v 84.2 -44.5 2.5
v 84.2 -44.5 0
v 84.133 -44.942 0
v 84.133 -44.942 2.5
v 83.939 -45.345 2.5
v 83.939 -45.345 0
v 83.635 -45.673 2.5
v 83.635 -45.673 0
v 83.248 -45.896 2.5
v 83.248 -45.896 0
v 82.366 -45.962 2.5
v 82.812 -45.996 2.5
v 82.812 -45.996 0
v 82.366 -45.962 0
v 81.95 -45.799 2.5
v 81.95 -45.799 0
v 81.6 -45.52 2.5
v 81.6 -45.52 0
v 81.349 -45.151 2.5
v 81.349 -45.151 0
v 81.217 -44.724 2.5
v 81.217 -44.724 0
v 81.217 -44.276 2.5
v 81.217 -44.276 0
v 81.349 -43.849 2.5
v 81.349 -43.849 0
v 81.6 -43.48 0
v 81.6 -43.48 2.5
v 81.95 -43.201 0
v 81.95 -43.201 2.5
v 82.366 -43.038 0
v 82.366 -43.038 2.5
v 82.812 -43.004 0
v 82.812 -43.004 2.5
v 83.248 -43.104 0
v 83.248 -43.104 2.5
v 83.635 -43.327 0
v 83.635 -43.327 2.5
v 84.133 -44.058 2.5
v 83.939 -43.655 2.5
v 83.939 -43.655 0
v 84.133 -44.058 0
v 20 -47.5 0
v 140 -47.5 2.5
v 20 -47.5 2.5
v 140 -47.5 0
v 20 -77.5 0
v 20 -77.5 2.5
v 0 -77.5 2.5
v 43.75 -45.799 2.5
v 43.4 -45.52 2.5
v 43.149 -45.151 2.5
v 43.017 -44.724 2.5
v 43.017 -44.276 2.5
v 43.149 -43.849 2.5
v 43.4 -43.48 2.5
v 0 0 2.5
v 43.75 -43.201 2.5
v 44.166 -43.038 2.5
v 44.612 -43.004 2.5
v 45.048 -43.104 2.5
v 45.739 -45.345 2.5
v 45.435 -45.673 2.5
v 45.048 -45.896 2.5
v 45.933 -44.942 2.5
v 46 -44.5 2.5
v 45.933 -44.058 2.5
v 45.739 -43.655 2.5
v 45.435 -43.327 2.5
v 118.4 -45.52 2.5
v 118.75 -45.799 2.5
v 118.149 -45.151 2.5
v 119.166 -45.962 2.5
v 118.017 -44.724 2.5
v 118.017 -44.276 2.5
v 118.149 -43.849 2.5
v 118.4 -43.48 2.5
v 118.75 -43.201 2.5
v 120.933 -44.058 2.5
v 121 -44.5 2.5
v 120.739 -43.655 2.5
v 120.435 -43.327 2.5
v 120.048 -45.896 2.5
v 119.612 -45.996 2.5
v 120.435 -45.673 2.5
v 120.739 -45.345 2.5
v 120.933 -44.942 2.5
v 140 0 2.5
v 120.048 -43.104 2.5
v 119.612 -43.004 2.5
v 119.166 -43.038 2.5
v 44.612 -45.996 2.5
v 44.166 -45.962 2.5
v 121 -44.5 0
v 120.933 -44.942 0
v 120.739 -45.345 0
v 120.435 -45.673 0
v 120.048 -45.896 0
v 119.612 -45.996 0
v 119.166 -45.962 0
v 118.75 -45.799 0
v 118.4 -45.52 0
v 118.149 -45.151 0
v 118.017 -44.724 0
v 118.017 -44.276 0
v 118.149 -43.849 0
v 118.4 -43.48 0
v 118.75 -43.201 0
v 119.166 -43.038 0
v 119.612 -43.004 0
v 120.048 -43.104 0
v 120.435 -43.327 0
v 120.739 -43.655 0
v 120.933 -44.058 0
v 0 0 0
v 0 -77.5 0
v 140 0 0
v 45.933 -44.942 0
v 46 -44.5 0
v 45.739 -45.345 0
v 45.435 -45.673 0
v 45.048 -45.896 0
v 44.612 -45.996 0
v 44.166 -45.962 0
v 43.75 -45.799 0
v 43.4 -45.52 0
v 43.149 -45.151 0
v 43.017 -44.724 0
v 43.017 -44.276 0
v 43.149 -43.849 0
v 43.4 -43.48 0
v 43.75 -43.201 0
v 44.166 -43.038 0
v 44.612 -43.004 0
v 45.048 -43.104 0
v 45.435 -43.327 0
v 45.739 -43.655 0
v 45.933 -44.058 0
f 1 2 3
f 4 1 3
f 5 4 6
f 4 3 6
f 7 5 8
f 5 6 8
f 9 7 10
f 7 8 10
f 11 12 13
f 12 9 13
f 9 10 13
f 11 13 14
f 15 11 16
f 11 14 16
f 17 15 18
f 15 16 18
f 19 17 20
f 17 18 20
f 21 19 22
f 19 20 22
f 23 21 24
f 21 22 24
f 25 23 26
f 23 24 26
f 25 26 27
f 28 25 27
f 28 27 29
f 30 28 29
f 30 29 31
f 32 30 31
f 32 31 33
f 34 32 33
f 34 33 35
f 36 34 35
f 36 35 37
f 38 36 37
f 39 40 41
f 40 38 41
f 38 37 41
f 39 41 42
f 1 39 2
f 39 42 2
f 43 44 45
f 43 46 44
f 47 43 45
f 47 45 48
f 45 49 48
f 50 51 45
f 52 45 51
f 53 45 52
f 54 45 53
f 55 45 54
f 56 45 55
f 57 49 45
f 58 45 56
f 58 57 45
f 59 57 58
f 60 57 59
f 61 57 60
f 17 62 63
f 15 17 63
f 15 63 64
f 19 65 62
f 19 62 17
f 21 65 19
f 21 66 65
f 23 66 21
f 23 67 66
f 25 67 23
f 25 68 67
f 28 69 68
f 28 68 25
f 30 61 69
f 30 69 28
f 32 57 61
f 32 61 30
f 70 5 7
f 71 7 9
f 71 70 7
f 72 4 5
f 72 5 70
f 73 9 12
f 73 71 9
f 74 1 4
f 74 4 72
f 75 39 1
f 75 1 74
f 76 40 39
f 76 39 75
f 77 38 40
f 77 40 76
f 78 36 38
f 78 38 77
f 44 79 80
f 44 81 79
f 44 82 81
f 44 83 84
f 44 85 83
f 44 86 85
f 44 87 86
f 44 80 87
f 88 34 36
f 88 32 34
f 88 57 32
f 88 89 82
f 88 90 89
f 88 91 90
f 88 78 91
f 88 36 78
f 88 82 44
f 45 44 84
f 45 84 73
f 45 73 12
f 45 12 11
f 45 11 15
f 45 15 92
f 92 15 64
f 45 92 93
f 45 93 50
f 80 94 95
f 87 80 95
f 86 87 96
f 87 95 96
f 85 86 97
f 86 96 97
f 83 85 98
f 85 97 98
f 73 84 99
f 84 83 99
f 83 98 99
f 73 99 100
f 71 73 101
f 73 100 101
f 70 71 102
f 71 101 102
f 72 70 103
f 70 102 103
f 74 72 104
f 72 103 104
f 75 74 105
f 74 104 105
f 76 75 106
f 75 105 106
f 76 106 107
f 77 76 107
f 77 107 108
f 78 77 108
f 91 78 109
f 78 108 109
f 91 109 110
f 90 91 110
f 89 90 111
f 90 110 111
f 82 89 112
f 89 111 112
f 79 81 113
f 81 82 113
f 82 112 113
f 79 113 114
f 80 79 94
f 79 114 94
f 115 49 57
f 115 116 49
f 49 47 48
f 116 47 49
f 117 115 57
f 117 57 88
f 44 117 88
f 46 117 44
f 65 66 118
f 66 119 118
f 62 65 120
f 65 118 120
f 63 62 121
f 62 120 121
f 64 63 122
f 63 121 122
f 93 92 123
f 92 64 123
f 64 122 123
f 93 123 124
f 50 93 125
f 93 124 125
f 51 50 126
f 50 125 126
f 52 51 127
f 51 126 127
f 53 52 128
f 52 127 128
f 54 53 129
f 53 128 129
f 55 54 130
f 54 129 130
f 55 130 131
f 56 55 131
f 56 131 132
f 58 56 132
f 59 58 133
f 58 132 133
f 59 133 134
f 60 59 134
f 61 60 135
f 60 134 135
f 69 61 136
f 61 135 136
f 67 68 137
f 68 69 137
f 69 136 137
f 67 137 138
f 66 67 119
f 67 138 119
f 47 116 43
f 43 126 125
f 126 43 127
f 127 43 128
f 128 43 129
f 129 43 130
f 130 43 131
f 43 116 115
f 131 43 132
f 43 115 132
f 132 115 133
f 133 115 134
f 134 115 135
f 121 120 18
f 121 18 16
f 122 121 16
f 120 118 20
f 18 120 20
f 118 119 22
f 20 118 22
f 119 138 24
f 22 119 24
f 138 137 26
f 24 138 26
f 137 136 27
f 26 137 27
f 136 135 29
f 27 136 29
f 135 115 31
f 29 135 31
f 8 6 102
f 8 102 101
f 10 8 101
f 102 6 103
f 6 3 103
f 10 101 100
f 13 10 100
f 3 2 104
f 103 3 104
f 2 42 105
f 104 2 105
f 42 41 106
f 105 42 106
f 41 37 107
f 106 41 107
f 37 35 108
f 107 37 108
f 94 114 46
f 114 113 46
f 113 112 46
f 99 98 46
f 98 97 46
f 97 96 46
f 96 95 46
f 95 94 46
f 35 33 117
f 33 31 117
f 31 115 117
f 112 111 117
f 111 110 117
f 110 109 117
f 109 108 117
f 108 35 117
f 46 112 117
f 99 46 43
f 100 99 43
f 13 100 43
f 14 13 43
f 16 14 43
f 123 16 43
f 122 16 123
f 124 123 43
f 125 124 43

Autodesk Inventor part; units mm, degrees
ref_plane "YZ Plane" through (0, 0, 0) normal (1, 0, 0) x (0, 1, 0)
ref_plane "XZ Plane" through (0, 0, 0) normal (0, 1, 0) x (-1, 0, 0)
ref_plane "XY Plane" through (0, 0, 0) normal (0, 0, 1) x (1, 0, 0)
sketch "Sketch1" plane through (0, 0, 0) normal (0, 0, 1) x (1, 0, 0)
  circle A0 centre (119.5, -44.5) radius 1.5
  circle A1 centre (82.7, -44.5) radius 1.5
  circle A2 centre (44.5, -44.5) radius 1.5
  line L0 (0, 0) -> (140, 0)
  line L1 (140, 0) -> (140, -47.5)
  line L2 (140, -47.5) -> (0, -47.5)
  line L3 (0, -47.5) -> (0, 0)
  line L4 (0, -47.5) -> (20, -47.5)
  line L5 (20, -47.5) -> (20, -77.5)
  line L6 (20, -77.5) -> (0, -77.5)
  line L7 (0, -77.5) -> (0, -47.5)
  dimension "d8" = 3
  dimension "d10" = 36.8
  dimension "d11" = 75
  dimension "d15" = 140
  dimension "d16" = 47.5
  dimension "d17" = 20
  dimension "d18" = 30
extrude "Extrusion1" add sketch "Sketch1" along normal blind 2.5
properties part number "IR_PCB_Inventor"
